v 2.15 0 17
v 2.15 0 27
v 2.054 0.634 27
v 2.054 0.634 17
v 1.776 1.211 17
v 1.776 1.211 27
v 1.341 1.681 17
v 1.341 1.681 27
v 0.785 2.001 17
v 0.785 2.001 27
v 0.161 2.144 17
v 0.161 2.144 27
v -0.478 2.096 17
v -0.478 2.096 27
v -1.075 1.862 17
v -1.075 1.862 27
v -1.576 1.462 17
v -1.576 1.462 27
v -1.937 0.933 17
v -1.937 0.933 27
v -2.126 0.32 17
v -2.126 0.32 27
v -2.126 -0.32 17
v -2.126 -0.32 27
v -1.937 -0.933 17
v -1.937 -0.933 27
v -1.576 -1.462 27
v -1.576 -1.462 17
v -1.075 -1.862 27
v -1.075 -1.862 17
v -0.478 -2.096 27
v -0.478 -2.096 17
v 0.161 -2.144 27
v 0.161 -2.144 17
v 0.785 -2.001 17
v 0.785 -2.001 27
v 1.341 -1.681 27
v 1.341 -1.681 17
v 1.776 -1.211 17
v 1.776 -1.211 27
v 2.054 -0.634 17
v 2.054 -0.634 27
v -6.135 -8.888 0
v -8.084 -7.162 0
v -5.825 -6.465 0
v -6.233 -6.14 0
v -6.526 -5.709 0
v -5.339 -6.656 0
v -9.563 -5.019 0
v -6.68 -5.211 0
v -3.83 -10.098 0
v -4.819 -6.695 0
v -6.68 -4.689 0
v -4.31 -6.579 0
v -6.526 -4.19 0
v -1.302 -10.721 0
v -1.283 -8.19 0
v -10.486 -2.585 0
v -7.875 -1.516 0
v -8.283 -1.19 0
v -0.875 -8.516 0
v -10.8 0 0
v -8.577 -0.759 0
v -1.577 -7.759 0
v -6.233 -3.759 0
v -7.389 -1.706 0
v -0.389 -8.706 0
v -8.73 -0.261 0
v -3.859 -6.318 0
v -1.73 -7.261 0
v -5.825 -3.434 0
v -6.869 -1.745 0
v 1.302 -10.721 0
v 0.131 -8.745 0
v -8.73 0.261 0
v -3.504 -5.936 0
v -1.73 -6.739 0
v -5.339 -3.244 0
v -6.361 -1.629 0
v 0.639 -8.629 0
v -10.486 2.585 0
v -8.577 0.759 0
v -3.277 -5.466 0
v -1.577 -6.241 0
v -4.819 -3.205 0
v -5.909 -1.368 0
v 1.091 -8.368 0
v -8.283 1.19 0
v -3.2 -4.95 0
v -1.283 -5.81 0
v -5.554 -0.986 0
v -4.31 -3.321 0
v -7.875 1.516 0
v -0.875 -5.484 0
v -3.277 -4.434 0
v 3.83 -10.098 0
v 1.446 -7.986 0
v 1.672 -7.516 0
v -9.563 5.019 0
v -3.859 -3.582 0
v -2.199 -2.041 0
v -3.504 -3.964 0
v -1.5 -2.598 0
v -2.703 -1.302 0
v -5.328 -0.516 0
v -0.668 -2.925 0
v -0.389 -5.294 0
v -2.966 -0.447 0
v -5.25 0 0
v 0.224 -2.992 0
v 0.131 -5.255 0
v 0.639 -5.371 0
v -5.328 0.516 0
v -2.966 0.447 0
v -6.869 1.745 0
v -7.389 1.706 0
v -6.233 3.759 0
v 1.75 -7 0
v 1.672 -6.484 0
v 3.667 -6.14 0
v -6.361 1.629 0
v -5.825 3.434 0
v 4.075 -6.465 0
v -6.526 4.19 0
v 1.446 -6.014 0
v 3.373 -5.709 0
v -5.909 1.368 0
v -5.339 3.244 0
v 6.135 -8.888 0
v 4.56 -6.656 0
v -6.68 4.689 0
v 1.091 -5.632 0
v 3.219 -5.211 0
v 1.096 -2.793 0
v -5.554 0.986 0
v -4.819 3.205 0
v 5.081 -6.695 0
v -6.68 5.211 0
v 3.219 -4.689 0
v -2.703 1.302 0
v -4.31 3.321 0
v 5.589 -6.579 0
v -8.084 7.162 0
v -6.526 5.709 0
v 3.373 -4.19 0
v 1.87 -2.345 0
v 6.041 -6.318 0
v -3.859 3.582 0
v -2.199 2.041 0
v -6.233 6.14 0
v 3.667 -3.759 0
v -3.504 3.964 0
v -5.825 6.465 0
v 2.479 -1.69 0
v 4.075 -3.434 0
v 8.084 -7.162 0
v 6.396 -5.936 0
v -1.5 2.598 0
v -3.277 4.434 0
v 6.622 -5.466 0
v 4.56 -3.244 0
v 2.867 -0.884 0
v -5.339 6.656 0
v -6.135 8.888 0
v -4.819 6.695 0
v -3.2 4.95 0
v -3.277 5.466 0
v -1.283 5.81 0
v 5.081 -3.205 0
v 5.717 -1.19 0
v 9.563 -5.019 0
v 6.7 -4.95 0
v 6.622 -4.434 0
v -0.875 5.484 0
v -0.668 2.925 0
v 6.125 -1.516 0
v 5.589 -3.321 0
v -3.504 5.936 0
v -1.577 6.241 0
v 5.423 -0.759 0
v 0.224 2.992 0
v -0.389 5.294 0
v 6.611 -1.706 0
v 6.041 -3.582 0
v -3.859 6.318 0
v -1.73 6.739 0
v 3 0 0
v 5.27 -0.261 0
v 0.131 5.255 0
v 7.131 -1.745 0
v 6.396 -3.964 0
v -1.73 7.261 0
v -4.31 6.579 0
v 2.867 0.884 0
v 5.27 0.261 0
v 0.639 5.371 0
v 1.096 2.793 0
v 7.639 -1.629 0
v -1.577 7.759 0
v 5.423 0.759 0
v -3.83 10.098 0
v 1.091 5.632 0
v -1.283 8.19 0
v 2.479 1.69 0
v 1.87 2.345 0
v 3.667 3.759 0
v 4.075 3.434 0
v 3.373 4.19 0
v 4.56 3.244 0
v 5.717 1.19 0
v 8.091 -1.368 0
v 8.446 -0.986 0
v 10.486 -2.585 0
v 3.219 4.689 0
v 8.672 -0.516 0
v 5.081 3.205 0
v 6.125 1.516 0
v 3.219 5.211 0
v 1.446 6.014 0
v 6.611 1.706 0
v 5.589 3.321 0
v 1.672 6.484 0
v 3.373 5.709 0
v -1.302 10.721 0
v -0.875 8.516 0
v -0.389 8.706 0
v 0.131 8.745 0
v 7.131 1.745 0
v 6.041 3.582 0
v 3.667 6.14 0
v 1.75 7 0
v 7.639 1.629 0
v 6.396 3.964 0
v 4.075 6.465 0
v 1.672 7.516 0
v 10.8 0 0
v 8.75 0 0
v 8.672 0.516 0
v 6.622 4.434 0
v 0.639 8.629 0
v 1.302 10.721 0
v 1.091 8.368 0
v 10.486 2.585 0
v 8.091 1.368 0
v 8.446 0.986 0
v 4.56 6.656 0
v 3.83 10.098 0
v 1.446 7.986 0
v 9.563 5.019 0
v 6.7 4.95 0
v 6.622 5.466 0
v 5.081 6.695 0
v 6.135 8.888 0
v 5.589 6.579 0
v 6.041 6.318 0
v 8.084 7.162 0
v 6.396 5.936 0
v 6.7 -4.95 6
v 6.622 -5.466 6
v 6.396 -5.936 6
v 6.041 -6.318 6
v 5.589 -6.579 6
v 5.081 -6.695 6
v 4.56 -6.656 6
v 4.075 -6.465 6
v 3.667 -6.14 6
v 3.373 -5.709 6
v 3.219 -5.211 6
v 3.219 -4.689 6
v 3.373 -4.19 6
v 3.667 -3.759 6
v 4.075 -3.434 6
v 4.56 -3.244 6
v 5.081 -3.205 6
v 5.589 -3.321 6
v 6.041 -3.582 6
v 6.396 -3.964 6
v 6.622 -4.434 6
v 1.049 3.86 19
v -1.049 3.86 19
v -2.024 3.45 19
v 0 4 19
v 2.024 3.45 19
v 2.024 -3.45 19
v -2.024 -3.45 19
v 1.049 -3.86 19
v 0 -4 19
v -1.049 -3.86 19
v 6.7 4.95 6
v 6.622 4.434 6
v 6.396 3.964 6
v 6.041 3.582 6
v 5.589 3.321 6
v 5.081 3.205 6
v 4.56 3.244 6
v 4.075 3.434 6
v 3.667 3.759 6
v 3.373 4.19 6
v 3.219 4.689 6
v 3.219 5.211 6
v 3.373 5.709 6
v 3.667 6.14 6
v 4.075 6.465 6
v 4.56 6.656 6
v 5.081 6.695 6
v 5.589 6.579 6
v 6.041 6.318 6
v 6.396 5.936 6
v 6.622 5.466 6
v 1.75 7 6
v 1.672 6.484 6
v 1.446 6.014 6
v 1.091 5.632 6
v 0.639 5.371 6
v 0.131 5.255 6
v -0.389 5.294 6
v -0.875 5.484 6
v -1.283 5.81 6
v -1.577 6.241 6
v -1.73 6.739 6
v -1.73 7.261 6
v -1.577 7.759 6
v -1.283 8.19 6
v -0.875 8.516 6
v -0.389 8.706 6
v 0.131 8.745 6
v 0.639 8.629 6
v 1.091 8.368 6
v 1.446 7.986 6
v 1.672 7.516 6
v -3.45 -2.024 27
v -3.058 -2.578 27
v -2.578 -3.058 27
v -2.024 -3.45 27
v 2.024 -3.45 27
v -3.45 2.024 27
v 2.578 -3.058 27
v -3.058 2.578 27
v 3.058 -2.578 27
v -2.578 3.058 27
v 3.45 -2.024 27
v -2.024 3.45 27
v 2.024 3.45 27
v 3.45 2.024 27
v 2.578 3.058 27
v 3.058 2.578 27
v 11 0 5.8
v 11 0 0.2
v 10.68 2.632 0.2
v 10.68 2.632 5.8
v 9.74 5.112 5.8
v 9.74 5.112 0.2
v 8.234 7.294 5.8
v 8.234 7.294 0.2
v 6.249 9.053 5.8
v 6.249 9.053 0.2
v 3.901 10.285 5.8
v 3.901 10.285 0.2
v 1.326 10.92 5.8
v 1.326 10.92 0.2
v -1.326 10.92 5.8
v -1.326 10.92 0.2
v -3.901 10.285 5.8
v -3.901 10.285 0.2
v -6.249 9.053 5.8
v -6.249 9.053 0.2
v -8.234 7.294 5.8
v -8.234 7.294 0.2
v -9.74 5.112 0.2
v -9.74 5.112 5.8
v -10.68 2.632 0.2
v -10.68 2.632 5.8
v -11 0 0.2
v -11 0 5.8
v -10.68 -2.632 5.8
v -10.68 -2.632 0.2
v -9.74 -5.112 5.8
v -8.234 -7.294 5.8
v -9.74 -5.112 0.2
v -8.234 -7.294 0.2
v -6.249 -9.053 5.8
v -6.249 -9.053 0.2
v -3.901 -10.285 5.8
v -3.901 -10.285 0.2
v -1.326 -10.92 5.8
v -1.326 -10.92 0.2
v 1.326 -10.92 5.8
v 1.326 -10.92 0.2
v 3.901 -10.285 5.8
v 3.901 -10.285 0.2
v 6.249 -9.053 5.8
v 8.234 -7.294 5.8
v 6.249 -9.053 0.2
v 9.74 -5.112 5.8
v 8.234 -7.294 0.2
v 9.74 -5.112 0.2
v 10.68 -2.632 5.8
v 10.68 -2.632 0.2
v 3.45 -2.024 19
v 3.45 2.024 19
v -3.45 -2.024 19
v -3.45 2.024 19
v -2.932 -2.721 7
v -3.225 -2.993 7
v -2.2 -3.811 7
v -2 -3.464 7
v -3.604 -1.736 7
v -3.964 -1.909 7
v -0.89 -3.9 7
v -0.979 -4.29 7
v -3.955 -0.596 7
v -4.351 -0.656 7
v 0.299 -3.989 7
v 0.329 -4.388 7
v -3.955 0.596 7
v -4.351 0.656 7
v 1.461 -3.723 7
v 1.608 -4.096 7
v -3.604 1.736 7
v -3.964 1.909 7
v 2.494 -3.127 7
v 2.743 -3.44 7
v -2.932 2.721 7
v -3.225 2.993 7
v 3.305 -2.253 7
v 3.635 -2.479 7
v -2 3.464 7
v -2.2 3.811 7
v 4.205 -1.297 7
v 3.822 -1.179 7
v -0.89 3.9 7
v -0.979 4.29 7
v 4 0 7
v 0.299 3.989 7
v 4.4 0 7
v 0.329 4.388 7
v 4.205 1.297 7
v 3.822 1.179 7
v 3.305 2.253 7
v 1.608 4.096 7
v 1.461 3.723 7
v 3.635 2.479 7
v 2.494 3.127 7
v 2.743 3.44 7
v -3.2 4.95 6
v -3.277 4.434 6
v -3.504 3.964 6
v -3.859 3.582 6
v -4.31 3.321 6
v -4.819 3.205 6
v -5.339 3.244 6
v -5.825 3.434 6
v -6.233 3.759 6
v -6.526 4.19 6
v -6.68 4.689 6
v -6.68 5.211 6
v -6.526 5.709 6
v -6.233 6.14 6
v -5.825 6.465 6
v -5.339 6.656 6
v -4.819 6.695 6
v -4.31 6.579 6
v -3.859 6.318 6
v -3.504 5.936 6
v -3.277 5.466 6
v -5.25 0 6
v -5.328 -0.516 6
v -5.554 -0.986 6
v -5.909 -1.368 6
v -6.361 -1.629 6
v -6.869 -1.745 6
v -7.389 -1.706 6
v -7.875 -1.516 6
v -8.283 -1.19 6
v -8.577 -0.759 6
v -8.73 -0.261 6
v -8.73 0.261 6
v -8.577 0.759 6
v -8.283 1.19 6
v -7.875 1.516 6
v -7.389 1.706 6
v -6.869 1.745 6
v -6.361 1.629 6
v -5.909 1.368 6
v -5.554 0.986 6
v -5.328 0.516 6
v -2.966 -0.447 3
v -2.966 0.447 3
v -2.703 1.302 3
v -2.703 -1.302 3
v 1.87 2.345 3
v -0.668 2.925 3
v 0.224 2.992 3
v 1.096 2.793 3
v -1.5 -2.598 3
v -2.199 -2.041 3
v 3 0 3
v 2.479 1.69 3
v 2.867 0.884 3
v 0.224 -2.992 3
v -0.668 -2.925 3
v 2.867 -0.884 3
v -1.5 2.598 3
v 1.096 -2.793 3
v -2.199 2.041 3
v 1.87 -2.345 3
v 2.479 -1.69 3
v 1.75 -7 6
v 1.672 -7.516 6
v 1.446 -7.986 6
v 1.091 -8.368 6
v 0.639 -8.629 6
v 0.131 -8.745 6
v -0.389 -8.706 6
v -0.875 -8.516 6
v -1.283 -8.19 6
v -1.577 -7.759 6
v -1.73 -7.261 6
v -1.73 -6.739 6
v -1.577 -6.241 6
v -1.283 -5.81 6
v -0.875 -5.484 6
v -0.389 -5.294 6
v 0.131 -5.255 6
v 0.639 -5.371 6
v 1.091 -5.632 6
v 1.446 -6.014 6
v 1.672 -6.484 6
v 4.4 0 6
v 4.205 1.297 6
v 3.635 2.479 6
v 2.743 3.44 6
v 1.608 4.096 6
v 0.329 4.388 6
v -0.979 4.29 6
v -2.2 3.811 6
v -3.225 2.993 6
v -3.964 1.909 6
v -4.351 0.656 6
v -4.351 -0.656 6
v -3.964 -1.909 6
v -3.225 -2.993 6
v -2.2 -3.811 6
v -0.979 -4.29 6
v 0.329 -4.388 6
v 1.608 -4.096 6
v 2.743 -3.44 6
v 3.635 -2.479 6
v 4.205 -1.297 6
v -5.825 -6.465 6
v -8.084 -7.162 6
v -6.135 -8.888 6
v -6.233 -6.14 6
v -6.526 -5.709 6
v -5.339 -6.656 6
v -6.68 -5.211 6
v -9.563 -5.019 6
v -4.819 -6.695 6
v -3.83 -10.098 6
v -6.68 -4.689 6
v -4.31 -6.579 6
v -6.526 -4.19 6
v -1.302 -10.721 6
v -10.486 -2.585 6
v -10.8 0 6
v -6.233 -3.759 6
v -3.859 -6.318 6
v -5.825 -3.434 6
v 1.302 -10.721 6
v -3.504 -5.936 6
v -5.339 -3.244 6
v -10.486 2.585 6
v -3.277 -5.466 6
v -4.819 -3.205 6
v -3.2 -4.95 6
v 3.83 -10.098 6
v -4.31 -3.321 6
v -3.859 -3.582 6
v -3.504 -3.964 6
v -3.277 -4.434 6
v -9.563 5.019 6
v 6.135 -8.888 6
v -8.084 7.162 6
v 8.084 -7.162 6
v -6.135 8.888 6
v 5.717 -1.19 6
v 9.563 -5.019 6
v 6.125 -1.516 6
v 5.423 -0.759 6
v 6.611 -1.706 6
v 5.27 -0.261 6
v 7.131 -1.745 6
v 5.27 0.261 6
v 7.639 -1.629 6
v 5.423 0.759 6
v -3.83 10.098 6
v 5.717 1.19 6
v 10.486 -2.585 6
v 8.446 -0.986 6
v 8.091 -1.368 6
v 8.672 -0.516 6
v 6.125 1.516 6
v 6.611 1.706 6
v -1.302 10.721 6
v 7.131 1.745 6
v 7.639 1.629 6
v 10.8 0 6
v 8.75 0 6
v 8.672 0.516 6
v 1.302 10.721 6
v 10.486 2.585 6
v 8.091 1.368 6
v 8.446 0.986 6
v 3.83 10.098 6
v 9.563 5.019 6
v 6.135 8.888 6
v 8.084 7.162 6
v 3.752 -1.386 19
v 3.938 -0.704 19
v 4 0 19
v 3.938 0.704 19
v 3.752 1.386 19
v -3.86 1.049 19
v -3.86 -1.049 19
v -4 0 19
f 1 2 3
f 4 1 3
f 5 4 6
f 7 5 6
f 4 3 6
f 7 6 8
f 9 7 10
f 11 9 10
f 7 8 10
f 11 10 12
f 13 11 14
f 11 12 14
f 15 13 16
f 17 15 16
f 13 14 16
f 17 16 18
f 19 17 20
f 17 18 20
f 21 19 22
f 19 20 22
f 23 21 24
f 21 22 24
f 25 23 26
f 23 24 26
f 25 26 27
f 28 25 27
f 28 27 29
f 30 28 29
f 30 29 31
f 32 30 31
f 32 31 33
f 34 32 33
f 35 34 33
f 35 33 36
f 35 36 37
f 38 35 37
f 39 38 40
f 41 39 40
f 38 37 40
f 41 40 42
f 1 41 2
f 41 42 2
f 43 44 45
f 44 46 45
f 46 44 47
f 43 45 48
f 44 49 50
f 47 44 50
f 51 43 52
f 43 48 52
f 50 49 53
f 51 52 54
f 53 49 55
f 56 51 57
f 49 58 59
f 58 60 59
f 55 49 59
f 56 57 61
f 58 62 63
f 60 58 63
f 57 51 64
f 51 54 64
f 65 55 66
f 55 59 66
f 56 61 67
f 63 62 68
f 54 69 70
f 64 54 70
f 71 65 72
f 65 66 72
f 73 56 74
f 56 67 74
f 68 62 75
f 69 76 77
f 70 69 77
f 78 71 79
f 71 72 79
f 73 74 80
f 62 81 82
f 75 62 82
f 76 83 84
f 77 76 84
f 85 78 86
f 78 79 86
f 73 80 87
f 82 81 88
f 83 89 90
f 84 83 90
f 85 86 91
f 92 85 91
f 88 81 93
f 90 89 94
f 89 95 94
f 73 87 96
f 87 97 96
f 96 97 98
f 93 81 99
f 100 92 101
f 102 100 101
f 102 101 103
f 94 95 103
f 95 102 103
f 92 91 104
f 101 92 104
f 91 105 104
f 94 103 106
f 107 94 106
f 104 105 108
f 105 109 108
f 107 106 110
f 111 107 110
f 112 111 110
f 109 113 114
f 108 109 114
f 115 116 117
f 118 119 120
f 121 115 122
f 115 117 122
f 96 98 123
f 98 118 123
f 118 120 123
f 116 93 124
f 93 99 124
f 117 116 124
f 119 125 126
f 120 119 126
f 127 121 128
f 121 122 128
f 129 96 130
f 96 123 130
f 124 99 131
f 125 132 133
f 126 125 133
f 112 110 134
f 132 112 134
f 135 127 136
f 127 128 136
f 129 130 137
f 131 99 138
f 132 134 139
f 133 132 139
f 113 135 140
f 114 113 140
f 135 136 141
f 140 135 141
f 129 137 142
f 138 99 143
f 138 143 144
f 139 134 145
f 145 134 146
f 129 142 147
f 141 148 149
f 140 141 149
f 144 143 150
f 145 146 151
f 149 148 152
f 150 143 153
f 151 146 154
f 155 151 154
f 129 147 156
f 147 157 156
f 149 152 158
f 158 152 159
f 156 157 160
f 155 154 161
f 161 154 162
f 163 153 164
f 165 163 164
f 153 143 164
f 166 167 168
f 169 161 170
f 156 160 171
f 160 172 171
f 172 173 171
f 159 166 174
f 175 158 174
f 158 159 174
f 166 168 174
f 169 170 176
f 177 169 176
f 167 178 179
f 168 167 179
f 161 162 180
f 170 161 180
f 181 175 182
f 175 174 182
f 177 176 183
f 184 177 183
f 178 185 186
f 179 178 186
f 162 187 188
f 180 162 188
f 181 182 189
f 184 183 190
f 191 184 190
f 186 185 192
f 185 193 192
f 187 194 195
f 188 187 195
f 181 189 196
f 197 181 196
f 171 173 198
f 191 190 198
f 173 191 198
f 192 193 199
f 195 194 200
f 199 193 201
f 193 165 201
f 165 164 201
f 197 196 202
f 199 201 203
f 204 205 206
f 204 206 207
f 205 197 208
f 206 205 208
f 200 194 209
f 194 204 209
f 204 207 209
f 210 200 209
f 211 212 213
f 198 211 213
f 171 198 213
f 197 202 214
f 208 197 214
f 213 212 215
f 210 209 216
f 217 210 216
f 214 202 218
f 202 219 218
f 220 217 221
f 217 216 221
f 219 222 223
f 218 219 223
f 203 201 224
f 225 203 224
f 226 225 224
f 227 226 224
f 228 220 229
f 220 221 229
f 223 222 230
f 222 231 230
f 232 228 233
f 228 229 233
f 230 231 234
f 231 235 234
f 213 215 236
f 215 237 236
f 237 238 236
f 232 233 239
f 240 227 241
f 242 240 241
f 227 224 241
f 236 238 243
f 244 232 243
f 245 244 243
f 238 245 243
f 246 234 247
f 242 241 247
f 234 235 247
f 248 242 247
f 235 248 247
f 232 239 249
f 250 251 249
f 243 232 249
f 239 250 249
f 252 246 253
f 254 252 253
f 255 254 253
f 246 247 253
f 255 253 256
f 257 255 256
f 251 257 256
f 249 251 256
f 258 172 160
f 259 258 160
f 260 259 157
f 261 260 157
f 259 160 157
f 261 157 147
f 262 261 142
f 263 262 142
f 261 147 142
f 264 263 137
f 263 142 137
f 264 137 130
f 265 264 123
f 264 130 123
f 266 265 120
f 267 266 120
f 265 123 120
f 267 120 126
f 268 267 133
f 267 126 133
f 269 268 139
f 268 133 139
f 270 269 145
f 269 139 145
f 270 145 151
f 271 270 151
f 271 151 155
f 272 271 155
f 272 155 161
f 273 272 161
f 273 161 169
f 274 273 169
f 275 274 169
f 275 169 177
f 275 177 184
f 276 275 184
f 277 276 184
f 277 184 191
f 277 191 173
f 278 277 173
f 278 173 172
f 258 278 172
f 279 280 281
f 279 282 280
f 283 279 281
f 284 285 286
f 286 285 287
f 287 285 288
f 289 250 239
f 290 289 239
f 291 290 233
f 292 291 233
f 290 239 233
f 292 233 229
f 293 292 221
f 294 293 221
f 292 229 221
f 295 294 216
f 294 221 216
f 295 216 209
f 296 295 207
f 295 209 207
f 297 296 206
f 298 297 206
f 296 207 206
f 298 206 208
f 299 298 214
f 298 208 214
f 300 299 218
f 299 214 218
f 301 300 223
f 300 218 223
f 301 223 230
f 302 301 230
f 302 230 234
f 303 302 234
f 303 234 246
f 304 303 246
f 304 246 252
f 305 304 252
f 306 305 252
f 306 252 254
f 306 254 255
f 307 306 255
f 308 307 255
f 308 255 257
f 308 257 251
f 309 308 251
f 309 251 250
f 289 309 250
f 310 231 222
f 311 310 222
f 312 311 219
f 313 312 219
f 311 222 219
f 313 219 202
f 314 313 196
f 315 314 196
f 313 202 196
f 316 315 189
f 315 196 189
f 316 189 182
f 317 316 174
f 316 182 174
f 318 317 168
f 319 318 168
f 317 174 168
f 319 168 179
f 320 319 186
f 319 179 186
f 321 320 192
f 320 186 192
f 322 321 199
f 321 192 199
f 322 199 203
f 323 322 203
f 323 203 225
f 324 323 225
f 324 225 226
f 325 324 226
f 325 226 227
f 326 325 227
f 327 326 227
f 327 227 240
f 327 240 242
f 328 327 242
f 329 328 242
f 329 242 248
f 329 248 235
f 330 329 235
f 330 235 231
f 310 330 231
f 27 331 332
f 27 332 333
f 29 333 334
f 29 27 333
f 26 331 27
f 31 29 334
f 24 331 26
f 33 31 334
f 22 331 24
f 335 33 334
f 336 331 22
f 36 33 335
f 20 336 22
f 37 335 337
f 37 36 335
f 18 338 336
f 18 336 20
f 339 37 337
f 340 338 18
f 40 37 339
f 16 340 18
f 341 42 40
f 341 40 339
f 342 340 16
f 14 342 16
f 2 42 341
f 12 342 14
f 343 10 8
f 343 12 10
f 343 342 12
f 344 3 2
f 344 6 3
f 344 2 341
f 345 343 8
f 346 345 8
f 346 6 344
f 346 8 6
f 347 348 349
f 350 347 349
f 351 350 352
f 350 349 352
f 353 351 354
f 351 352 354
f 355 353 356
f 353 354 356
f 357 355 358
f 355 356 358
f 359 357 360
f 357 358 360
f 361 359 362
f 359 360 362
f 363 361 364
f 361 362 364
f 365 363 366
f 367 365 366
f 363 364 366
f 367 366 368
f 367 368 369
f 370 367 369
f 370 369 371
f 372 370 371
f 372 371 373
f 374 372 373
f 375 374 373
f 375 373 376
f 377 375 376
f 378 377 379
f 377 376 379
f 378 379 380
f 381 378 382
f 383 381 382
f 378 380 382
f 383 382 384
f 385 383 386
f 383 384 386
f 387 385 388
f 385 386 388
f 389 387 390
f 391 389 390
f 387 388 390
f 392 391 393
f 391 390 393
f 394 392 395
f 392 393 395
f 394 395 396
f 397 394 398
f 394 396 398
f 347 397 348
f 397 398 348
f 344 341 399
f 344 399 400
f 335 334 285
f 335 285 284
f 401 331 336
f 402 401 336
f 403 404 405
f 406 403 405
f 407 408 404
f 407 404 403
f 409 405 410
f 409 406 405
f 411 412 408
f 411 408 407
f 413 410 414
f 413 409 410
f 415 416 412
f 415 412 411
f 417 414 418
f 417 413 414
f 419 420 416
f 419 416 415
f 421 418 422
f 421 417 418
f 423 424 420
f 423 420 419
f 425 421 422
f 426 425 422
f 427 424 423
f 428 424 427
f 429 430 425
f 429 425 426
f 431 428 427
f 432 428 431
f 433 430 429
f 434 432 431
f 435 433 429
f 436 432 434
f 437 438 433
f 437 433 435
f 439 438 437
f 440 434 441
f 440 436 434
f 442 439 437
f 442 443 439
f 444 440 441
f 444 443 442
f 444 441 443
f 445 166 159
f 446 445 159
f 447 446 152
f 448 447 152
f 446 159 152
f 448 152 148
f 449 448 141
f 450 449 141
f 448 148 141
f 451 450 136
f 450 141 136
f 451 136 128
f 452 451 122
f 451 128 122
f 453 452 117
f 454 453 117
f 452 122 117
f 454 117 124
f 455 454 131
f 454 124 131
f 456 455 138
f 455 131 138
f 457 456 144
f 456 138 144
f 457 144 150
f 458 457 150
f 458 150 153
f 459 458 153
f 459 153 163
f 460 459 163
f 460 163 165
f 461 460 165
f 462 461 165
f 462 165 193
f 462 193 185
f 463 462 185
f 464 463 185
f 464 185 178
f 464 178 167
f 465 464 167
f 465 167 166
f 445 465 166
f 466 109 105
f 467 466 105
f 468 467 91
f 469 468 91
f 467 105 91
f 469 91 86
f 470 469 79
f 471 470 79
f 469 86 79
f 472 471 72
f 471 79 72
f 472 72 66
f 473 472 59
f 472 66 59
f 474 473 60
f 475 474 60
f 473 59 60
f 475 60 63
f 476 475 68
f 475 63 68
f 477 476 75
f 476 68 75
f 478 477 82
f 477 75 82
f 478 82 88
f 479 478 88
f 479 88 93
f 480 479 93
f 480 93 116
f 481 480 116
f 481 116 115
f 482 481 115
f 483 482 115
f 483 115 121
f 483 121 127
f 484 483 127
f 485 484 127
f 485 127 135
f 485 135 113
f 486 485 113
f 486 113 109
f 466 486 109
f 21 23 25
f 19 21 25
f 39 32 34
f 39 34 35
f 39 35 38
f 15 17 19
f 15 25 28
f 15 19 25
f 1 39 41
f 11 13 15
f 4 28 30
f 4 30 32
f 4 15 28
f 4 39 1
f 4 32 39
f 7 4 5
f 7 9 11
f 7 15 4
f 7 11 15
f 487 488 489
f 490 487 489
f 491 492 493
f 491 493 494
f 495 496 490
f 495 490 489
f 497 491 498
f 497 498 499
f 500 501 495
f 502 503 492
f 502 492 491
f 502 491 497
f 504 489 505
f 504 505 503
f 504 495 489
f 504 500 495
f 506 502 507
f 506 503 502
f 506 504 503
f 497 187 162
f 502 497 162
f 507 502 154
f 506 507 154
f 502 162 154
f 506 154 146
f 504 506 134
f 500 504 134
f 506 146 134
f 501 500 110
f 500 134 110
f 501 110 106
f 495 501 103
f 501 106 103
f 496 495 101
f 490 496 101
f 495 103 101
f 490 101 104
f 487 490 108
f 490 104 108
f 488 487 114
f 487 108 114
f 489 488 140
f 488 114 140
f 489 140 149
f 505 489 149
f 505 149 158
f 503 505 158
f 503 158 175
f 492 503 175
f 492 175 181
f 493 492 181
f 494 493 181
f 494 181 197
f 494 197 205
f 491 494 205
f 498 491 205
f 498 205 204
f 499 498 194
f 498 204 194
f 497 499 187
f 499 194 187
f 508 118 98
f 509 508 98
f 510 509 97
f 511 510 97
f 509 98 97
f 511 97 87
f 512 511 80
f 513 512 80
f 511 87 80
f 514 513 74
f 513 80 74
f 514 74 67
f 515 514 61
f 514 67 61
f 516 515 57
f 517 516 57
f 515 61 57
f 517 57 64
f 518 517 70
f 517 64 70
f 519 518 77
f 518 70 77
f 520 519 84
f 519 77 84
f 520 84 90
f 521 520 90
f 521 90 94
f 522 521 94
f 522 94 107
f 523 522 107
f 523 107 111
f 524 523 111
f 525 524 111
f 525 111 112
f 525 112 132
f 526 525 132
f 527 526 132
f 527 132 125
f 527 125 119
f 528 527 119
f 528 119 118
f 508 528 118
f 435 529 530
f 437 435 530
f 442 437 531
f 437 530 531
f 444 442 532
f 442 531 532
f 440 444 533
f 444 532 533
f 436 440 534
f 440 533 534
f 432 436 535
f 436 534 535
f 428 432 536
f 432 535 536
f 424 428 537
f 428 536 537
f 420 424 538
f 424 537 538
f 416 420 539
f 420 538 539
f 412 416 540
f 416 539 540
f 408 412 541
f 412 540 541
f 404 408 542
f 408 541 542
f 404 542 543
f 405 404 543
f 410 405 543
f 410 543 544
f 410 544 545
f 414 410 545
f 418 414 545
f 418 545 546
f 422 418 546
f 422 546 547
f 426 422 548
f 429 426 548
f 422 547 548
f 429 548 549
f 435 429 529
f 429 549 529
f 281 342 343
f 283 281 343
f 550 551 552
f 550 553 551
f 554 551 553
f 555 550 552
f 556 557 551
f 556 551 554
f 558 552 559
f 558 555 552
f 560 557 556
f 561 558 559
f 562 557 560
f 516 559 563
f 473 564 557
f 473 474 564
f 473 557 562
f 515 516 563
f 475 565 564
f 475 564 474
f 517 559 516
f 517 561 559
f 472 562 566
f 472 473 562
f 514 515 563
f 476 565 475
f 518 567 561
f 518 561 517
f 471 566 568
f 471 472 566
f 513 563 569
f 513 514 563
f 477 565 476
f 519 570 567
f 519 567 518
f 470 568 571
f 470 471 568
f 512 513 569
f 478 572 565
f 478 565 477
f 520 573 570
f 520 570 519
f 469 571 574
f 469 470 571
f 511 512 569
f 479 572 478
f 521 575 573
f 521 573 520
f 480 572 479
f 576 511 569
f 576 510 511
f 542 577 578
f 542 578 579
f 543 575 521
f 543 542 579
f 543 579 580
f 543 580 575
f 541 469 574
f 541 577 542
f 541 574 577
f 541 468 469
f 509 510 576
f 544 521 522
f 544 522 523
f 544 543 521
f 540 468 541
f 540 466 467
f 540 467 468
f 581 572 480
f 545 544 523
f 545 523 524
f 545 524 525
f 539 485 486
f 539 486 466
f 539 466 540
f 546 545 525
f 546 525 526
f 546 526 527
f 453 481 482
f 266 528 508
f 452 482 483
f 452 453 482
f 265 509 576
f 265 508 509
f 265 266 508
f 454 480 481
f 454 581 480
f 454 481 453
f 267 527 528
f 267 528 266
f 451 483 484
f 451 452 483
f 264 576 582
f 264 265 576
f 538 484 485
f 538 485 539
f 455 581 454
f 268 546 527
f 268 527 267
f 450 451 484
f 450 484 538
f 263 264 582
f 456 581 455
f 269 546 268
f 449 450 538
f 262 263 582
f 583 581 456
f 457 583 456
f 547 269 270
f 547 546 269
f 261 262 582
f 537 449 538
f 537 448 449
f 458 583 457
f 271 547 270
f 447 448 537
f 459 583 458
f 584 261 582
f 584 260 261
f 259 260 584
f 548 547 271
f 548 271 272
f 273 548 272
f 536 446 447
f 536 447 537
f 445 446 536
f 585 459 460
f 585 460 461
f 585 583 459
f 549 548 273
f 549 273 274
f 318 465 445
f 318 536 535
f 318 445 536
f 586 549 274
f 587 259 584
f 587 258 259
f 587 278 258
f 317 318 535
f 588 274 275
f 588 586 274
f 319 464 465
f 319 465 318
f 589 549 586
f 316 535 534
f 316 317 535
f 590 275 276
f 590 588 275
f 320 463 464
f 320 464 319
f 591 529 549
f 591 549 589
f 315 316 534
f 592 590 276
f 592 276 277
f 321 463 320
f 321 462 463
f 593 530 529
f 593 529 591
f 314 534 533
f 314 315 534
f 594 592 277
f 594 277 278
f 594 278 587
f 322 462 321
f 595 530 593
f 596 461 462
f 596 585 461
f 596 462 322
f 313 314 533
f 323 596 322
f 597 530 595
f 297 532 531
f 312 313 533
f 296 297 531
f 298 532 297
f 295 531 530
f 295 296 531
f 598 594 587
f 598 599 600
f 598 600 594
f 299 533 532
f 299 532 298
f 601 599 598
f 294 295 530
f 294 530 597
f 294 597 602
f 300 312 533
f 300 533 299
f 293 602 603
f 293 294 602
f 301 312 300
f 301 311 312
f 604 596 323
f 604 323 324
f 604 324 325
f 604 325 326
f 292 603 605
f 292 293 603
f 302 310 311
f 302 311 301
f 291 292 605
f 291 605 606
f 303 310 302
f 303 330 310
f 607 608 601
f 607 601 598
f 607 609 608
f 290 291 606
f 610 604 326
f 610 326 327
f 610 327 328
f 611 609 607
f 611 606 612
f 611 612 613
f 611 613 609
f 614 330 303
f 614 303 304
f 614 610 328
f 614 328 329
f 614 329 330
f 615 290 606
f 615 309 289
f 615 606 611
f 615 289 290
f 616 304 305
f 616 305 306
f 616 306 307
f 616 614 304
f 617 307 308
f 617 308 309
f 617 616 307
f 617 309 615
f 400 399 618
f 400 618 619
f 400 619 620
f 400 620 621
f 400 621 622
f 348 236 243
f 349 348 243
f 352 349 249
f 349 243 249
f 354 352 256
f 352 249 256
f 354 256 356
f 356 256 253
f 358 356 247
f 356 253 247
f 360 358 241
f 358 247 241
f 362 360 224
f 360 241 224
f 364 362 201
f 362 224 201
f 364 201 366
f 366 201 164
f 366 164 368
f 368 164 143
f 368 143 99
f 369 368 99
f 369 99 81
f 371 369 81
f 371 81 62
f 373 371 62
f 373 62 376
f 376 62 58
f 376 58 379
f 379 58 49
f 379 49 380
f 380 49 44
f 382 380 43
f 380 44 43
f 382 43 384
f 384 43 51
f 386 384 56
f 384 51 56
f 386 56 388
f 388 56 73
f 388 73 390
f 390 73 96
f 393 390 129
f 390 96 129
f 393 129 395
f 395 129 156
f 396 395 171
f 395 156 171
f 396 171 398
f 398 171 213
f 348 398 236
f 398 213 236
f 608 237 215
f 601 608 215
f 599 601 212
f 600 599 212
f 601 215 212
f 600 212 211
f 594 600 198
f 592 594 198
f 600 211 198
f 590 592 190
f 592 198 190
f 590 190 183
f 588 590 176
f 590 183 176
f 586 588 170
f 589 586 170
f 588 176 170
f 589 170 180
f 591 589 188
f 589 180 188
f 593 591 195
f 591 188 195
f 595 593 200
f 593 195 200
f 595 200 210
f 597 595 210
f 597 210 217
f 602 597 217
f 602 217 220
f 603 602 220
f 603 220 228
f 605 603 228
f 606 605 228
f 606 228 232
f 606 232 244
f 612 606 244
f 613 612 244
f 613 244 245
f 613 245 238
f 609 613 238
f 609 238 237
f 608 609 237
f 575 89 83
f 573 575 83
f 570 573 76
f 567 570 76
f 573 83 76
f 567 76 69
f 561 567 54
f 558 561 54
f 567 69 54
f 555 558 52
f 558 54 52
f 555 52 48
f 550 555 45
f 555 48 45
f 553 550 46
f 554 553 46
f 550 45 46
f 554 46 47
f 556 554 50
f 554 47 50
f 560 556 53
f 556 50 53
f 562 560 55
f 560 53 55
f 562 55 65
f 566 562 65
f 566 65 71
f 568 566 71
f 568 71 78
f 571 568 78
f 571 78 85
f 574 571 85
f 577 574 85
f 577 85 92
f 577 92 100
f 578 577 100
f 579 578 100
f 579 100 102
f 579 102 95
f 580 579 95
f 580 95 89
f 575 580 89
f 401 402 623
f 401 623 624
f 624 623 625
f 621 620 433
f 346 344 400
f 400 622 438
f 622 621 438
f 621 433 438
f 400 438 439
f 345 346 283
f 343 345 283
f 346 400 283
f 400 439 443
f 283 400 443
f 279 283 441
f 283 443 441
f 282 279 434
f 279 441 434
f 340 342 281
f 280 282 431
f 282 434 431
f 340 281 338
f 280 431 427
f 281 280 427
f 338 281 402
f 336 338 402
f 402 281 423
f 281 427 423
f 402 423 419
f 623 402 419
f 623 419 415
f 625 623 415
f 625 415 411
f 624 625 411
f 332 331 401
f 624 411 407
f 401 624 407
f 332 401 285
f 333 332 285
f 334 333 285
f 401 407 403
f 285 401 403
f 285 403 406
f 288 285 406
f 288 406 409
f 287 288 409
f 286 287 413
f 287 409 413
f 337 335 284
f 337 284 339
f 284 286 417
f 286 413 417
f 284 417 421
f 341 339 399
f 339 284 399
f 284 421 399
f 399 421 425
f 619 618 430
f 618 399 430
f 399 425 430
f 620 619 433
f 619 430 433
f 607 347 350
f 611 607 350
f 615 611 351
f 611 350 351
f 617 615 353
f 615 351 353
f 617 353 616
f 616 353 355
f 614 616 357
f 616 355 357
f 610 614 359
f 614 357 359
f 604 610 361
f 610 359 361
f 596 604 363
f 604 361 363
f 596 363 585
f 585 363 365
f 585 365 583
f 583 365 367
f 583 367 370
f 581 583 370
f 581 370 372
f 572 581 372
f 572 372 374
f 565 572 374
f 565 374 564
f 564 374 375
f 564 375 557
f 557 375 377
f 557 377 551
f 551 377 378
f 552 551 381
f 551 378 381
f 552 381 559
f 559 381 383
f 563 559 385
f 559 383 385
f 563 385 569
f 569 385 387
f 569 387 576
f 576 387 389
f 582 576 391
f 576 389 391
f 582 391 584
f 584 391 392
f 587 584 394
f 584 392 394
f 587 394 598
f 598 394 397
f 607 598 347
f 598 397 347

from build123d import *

# Parameters (mm, degrees)
F0_R      = 11
F1_DEPTH  = 6
F2_R      = 4
F3_DEPTH  = 21
F4_R      = 4.4
F5_DEPTH  = 1
F6_W      = 10
F6_H      = 10
F6_W_2    = 6.9
F6_H_2    = 6.9
F7_DEPTH  = 8
F8_R      = 1.75
F9_DEPTH  = 25
F11_SIZE  = 0.2
F12_R     = 2.15
F13_DEPTH = 10
F10_R     = 3
F14_DEPTH = 3


with BuildPart() as f1:
    # F0 (on Top) → F1 (new body)
    with BuildSketch(Plane.XY):
        Circle(F0_R)
    extrude(amount=F1_DEPTH)

    # F2 (on face) → F3 (join)
    with BuildSketch(Plane.XY.offset(6)):
        Circle(F2_R)
    extrude(amount=F3_DEPTH)

    # F4 (on face) → F5 (join)
    with BuildSketch(Plane.XY.offset(6)):
        Circle(F4_R)
    extrude(amount=F5_DEPTH)

    # F6 (on face) → F7 (cut)
    with BuildSketch(Plane.XY.offset(27)):
        Rectangle(F6_W, F6_H)
        Rectangle(F6_W_2, F6_H_2, mode=Mode.SUBTRACT)
    extrude(amount=-F7_DEPTH, mode=Mode.SUBTRACT)

    # F8 (on face) → F9 (cut)
    with BuildSketch(Plane(origin=(0, 0, 0), x_dir=(1, 0, 0), z_dir=(0, 0, -1))):
        with Locations((0, 7)):
            Circle(F8_R)
        with Locations((-4.949747, 4.949747)):
            Circle(F8_R)
        with Locations((-7, 0)):
            Circle(F8_R)
        with Locations((-4.949747, -4.949747)):
            Circle(F8_R)
        with Locations((0, -7)):
            Circle(F8_R)
        with Locations((4.949747, -4.949747)):
            Circle(F8_R)
        with Locations((7, 0)):
            Circle(F8_R)
        with Locations((4.949747, 4.949747)):
            Circle(F8_R)
    extrude(amount=-F9_DEPTH, mode=Mode.SUBTRACT)

    # F11
    f11_edges = [f1.edges().sort_by_distance(p)[0] for p in [
        (11, 0, 3),
        (-11, 0, 0),
        (-11, 0, 6),
    ]]
    chamfer(f11_edges, length=F11_SIZE)

    # F12 (on face) → F13 (cut)
    with BuildSketch(Plane.XY.offset(27)):
        Circle(F12_R)
    extrude(amount=-F13_DEPTH, mode=Mode.SUBTRACT)

    # F10 (on face) → F14 (cut)
    with BuildSketch(Plane(origin=(0, 0, 0), x_dir=(1, 0, 0), z_dir=(0, 0, -1))):
        Circle(F10_R)
    extrude(amount=-F14_DEPTH, mode=Mode.SUBTRACT)


solid = f1.part
